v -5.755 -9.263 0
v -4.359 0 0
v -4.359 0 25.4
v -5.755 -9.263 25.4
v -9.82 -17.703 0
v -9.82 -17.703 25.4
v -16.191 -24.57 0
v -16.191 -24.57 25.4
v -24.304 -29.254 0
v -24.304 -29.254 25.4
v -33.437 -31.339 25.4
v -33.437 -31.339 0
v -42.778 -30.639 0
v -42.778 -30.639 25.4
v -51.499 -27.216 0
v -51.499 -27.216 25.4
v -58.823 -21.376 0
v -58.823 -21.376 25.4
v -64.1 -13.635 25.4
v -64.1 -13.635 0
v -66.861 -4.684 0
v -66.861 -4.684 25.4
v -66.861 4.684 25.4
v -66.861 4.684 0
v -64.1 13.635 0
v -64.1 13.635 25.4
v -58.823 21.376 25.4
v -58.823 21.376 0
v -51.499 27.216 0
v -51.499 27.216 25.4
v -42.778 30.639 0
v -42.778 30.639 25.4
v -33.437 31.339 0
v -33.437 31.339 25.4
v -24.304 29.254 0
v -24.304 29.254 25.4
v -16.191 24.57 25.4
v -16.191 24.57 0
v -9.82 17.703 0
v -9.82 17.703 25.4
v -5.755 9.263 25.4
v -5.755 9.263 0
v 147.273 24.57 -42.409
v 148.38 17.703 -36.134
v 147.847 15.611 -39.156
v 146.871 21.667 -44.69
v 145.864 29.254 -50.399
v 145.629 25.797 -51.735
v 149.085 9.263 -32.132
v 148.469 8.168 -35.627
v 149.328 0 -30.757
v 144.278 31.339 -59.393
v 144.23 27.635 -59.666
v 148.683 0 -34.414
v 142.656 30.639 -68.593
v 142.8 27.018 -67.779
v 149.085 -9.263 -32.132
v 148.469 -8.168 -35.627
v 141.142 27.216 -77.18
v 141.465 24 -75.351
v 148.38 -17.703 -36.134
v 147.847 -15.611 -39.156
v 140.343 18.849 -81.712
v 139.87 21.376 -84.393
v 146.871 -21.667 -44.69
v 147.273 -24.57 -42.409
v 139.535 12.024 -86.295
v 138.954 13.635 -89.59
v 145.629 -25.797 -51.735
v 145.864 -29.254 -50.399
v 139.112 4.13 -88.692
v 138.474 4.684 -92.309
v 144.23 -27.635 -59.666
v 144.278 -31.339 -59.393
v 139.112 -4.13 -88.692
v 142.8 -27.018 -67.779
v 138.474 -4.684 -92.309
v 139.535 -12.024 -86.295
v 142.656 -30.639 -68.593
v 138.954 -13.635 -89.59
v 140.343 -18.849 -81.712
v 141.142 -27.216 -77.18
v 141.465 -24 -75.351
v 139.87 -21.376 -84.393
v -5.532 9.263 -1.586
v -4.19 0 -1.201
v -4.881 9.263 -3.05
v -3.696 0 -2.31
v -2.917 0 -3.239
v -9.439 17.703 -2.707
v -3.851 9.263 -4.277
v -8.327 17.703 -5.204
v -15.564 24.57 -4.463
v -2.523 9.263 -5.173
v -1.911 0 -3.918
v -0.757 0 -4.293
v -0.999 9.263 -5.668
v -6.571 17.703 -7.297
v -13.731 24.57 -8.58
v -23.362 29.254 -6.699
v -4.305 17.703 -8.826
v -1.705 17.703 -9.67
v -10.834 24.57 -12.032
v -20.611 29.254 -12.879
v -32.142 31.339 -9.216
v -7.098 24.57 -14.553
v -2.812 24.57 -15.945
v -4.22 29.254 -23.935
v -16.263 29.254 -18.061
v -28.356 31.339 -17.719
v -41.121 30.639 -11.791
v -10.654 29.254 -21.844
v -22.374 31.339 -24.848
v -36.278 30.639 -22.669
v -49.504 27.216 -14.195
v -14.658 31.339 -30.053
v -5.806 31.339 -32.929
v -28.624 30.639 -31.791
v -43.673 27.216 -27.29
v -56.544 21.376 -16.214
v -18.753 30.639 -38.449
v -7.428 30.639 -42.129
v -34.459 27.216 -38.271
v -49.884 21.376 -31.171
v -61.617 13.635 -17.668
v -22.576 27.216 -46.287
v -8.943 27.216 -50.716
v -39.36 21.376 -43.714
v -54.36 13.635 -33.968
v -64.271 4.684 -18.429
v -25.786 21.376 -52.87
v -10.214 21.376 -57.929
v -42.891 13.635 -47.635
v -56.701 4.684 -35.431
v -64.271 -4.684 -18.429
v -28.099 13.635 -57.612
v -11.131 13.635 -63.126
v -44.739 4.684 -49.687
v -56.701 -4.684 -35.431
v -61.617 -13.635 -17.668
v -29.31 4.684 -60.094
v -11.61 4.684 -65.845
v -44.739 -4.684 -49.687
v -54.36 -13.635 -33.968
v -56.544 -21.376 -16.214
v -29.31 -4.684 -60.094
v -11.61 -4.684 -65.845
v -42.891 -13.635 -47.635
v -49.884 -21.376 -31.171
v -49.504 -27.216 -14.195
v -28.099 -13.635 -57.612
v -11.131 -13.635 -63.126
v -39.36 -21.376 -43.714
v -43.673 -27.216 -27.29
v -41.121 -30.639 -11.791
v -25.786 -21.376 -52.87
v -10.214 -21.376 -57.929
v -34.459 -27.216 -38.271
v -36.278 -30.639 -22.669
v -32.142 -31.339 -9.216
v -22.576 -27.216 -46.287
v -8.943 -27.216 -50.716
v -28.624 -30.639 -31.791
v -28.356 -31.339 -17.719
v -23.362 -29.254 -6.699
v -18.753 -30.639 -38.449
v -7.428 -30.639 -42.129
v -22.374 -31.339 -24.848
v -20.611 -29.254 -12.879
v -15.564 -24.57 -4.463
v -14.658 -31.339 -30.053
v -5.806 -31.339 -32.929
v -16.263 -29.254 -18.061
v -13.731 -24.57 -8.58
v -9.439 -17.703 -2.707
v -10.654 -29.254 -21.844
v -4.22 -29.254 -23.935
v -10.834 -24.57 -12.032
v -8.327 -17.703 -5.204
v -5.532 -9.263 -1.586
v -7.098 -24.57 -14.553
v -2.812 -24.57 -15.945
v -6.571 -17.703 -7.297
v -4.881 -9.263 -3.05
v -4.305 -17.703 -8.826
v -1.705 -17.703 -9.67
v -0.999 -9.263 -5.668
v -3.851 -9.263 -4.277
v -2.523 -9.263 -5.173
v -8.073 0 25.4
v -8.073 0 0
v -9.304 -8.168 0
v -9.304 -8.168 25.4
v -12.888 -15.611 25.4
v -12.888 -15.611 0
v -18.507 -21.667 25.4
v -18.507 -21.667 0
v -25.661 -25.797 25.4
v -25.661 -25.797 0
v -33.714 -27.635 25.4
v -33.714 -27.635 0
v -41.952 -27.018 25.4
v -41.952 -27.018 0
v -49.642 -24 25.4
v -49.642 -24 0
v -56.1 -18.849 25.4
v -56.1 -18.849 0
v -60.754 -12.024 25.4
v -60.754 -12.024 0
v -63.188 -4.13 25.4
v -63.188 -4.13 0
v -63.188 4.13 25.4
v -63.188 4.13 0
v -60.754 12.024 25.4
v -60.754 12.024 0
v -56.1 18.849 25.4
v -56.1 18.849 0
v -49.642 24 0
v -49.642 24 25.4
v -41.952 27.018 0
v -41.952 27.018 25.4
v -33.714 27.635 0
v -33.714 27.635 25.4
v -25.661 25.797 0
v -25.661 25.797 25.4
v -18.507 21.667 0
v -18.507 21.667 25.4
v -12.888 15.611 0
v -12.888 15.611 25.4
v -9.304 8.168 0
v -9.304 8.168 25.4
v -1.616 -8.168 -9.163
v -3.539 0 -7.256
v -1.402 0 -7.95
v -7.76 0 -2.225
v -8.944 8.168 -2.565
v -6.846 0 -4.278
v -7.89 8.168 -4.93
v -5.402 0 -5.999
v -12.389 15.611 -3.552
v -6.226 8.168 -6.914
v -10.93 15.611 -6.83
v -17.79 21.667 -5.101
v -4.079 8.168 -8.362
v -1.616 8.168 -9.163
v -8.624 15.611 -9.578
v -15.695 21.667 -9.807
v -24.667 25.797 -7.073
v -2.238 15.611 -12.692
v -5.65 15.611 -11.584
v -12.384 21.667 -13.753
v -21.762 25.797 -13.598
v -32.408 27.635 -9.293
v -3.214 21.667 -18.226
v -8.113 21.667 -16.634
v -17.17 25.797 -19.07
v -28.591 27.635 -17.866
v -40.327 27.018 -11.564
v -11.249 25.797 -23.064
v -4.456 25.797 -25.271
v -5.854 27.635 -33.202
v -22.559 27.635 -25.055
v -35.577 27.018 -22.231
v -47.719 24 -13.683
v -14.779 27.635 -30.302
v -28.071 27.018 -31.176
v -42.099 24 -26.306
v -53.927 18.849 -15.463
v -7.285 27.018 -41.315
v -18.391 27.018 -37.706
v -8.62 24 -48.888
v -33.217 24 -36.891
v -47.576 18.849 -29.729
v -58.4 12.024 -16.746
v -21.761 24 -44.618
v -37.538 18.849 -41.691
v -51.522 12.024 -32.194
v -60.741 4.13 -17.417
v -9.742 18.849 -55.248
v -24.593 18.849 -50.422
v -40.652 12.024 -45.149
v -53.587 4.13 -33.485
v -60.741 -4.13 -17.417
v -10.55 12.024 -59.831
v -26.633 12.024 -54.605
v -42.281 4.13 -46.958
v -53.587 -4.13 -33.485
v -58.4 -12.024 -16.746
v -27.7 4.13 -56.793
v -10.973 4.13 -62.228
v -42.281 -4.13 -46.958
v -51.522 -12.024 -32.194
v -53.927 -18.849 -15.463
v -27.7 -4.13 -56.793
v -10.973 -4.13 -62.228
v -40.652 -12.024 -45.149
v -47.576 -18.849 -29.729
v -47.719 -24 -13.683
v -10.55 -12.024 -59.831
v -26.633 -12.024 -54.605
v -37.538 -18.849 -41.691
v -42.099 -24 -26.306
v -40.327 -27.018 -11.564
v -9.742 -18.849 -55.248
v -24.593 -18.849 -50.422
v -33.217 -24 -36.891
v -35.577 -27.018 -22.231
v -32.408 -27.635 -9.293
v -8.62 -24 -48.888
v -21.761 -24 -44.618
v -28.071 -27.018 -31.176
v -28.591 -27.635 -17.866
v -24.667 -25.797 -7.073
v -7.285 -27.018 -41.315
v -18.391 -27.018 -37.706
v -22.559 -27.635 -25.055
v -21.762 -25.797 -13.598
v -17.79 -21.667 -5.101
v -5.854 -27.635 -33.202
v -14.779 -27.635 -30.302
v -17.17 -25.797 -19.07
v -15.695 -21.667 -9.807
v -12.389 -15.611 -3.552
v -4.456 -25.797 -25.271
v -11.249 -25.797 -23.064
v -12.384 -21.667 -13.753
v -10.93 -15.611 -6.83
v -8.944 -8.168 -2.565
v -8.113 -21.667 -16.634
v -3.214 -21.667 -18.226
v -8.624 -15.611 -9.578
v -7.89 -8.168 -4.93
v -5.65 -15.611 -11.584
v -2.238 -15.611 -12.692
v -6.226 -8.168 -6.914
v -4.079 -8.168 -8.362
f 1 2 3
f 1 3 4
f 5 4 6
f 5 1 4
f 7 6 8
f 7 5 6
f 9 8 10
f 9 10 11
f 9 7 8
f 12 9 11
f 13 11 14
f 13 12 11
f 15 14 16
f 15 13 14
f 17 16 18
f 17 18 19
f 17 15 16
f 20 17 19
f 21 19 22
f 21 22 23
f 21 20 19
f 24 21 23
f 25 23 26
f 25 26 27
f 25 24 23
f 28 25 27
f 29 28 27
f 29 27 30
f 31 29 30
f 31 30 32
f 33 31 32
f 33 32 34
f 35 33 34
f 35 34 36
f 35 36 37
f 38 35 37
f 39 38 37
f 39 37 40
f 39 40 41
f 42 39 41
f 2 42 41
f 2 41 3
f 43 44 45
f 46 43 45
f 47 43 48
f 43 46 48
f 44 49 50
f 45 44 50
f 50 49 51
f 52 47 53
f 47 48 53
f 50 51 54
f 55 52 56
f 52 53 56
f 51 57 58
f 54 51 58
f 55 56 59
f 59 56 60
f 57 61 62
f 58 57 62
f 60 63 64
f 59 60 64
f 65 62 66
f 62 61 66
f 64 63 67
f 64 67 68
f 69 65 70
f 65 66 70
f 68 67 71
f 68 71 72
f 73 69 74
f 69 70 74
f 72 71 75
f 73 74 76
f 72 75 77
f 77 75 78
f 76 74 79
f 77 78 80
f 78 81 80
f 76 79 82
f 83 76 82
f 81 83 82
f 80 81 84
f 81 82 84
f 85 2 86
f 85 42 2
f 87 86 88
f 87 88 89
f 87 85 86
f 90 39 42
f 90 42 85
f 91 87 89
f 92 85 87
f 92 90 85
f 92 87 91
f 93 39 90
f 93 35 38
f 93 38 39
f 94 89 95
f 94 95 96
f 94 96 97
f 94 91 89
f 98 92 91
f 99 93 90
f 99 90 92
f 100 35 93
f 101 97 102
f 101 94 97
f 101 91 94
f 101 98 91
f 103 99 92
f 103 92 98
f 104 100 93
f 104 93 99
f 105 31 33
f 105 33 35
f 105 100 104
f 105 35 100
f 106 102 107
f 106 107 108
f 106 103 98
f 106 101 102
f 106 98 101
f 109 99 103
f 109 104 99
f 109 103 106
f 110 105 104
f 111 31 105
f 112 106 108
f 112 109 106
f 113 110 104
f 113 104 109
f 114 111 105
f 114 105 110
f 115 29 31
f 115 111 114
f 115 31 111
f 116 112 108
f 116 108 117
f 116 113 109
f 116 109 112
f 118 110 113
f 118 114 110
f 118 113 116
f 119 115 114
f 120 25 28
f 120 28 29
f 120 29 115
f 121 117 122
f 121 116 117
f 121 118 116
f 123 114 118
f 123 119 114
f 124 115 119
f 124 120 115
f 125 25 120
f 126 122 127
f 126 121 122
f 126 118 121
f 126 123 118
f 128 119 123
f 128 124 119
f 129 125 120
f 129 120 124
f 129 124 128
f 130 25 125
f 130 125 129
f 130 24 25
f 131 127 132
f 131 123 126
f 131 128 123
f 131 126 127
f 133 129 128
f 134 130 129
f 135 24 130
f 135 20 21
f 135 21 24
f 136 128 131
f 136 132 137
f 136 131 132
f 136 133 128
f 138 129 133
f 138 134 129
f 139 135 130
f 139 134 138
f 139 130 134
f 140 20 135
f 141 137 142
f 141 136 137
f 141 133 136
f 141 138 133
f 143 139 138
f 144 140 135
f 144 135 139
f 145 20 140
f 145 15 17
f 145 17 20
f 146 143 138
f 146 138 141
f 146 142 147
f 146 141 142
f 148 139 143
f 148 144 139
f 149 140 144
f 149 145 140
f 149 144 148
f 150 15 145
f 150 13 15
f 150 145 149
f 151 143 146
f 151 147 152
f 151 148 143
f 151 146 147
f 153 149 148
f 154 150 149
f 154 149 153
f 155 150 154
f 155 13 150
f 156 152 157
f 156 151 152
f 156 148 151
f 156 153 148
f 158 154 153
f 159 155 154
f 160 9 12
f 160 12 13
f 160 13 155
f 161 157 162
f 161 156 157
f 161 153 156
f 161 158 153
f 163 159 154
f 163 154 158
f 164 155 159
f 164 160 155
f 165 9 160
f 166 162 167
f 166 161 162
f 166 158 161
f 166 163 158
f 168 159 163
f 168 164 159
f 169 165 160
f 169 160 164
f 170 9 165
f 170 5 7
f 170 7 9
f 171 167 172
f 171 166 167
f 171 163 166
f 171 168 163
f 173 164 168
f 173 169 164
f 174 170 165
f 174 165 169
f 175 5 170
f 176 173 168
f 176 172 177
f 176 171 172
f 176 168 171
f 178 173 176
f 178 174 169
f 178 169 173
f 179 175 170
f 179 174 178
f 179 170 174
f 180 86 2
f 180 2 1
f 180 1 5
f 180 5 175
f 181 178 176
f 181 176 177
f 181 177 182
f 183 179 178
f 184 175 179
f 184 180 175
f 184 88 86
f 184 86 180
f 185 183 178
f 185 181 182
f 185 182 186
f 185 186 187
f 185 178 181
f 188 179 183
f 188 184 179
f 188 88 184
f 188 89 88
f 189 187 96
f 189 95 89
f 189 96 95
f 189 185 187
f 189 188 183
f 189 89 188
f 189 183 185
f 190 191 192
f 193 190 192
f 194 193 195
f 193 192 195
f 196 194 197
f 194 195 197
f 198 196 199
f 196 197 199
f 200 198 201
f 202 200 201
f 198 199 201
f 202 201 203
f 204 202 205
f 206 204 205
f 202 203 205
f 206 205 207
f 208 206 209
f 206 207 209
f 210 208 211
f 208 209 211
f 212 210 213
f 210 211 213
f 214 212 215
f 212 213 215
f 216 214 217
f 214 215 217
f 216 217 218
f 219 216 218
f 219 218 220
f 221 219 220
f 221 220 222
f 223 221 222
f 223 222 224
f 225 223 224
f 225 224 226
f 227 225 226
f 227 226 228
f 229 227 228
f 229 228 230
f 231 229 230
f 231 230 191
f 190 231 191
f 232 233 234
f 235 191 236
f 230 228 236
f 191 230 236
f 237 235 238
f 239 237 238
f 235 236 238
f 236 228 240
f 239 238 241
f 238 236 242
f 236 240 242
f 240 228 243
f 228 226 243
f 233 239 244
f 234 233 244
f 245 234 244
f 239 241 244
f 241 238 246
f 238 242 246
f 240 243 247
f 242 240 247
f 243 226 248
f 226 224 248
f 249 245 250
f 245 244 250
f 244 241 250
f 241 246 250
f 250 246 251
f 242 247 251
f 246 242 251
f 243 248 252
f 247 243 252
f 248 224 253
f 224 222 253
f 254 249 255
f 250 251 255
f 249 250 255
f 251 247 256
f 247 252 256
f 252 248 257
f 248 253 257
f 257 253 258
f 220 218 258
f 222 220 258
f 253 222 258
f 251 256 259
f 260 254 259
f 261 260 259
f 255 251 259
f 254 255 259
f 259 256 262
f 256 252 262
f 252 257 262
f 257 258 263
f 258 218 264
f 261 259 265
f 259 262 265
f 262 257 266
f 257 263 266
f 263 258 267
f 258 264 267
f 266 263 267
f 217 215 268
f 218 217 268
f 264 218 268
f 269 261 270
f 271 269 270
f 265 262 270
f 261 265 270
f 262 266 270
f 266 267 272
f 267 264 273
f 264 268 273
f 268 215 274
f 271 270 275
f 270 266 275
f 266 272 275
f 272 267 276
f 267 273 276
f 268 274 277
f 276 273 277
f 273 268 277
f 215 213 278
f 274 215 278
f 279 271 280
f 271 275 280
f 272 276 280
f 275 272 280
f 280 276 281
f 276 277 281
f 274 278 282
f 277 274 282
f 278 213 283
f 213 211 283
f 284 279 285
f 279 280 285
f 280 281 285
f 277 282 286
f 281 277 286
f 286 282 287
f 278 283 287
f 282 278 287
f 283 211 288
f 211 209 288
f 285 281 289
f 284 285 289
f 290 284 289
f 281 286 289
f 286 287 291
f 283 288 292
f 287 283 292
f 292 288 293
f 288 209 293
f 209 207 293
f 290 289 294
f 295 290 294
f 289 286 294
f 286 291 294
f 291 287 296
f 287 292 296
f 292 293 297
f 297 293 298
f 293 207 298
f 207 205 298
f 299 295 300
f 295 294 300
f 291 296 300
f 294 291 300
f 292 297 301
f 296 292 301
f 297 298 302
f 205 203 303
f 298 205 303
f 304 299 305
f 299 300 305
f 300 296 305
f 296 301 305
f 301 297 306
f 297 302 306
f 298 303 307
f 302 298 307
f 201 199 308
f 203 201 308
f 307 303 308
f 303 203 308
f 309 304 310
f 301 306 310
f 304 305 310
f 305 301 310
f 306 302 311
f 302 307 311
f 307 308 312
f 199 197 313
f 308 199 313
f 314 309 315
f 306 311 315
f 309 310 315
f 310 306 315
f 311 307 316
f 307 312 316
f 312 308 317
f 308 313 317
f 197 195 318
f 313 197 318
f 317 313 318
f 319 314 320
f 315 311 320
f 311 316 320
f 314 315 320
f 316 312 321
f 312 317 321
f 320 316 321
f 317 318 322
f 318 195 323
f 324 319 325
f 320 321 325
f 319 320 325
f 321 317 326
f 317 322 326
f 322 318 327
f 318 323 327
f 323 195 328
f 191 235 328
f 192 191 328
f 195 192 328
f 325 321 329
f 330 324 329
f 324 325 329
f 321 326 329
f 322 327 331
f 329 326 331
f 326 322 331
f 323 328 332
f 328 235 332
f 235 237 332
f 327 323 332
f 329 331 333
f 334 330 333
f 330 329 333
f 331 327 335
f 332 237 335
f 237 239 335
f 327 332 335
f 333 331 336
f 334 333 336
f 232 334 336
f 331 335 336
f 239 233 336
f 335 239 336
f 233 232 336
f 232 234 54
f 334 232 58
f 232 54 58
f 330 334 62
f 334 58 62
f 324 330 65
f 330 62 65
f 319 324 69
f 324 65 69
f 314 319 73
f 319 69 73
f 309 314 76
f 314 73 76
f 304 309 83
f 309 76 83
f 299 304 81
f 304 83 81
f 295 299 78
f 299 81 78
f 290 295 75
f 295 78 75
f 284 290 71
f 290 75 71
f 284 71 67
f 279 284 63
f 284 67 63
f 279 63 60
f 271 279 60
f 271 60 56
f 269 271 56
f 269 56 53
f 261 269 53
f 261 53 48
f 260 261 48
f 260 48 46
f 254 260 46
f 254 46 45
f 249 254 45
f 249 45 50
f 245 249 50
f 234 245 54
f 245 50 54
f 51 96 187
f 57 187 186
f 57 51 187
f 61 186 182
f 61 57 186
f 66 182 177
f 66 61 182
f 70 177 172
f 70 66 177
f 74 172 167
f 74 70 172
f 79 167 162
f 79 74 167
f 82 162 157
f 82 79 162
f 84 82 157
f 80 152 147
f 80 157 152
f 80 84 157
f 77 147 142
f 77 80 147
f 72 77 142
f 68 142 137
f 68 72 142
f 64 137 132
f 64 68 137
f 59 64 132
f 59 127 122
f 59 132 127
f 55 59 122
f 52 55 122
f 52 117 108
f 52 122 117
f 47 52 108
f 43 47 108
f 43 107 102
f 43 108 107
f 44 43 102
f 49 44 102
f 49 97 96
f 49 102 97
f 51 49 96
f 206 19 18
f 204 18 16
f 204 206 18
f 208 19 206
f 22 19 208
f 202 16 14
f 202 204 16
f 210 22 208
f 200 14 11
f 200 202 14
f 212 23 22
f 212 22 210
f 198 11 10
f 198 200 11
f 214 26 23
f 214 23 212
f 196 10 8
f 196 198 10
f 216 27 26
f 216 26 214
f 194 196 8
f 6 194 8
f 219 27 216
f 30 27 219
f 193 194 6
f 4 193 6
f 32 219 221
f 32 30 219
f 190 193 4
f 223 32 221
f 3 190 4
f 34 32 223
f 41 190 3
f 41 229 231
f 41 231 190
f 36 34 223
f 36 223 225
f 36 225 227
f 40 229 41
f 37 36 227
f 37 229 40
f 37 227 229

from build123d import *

# Parameters (mm, degrees)
F1_R   = 31.4265848645
F1_R_2 = 27.7125712081


# Not quite as in the source:
# - the program builds the solid bodies; features that only make, move or delete a surface that nothing else refers to are left out


with BuildPart() as f2:
    # F2: sweep along a path in F0
    with BuildLine(Plane.XZ) as f2_path:
        Line((-35.56, 25.4), (-35.56, 0))
        ThreePointArc((-35.56, 0), (-27.2405403973, -22.8575274005), (-6.1749291978, -35.0197636971))
        Line((-6.1749291978, -35.0197636971), (143.9097723612, -61.4837459736))
    # F1 (on Top) → F2 (sweep)
    with BuildSketch(Plane.XY):
        with Locations((-35.7853956521, 0)):
            Circle(F1_R)
        with Locations((-35.7853956521, 0)):
            Circle(F1_R_2, mode=Mode.SUBTRACT)
    sweep(path=f2_path.line)


solid = f2.part
